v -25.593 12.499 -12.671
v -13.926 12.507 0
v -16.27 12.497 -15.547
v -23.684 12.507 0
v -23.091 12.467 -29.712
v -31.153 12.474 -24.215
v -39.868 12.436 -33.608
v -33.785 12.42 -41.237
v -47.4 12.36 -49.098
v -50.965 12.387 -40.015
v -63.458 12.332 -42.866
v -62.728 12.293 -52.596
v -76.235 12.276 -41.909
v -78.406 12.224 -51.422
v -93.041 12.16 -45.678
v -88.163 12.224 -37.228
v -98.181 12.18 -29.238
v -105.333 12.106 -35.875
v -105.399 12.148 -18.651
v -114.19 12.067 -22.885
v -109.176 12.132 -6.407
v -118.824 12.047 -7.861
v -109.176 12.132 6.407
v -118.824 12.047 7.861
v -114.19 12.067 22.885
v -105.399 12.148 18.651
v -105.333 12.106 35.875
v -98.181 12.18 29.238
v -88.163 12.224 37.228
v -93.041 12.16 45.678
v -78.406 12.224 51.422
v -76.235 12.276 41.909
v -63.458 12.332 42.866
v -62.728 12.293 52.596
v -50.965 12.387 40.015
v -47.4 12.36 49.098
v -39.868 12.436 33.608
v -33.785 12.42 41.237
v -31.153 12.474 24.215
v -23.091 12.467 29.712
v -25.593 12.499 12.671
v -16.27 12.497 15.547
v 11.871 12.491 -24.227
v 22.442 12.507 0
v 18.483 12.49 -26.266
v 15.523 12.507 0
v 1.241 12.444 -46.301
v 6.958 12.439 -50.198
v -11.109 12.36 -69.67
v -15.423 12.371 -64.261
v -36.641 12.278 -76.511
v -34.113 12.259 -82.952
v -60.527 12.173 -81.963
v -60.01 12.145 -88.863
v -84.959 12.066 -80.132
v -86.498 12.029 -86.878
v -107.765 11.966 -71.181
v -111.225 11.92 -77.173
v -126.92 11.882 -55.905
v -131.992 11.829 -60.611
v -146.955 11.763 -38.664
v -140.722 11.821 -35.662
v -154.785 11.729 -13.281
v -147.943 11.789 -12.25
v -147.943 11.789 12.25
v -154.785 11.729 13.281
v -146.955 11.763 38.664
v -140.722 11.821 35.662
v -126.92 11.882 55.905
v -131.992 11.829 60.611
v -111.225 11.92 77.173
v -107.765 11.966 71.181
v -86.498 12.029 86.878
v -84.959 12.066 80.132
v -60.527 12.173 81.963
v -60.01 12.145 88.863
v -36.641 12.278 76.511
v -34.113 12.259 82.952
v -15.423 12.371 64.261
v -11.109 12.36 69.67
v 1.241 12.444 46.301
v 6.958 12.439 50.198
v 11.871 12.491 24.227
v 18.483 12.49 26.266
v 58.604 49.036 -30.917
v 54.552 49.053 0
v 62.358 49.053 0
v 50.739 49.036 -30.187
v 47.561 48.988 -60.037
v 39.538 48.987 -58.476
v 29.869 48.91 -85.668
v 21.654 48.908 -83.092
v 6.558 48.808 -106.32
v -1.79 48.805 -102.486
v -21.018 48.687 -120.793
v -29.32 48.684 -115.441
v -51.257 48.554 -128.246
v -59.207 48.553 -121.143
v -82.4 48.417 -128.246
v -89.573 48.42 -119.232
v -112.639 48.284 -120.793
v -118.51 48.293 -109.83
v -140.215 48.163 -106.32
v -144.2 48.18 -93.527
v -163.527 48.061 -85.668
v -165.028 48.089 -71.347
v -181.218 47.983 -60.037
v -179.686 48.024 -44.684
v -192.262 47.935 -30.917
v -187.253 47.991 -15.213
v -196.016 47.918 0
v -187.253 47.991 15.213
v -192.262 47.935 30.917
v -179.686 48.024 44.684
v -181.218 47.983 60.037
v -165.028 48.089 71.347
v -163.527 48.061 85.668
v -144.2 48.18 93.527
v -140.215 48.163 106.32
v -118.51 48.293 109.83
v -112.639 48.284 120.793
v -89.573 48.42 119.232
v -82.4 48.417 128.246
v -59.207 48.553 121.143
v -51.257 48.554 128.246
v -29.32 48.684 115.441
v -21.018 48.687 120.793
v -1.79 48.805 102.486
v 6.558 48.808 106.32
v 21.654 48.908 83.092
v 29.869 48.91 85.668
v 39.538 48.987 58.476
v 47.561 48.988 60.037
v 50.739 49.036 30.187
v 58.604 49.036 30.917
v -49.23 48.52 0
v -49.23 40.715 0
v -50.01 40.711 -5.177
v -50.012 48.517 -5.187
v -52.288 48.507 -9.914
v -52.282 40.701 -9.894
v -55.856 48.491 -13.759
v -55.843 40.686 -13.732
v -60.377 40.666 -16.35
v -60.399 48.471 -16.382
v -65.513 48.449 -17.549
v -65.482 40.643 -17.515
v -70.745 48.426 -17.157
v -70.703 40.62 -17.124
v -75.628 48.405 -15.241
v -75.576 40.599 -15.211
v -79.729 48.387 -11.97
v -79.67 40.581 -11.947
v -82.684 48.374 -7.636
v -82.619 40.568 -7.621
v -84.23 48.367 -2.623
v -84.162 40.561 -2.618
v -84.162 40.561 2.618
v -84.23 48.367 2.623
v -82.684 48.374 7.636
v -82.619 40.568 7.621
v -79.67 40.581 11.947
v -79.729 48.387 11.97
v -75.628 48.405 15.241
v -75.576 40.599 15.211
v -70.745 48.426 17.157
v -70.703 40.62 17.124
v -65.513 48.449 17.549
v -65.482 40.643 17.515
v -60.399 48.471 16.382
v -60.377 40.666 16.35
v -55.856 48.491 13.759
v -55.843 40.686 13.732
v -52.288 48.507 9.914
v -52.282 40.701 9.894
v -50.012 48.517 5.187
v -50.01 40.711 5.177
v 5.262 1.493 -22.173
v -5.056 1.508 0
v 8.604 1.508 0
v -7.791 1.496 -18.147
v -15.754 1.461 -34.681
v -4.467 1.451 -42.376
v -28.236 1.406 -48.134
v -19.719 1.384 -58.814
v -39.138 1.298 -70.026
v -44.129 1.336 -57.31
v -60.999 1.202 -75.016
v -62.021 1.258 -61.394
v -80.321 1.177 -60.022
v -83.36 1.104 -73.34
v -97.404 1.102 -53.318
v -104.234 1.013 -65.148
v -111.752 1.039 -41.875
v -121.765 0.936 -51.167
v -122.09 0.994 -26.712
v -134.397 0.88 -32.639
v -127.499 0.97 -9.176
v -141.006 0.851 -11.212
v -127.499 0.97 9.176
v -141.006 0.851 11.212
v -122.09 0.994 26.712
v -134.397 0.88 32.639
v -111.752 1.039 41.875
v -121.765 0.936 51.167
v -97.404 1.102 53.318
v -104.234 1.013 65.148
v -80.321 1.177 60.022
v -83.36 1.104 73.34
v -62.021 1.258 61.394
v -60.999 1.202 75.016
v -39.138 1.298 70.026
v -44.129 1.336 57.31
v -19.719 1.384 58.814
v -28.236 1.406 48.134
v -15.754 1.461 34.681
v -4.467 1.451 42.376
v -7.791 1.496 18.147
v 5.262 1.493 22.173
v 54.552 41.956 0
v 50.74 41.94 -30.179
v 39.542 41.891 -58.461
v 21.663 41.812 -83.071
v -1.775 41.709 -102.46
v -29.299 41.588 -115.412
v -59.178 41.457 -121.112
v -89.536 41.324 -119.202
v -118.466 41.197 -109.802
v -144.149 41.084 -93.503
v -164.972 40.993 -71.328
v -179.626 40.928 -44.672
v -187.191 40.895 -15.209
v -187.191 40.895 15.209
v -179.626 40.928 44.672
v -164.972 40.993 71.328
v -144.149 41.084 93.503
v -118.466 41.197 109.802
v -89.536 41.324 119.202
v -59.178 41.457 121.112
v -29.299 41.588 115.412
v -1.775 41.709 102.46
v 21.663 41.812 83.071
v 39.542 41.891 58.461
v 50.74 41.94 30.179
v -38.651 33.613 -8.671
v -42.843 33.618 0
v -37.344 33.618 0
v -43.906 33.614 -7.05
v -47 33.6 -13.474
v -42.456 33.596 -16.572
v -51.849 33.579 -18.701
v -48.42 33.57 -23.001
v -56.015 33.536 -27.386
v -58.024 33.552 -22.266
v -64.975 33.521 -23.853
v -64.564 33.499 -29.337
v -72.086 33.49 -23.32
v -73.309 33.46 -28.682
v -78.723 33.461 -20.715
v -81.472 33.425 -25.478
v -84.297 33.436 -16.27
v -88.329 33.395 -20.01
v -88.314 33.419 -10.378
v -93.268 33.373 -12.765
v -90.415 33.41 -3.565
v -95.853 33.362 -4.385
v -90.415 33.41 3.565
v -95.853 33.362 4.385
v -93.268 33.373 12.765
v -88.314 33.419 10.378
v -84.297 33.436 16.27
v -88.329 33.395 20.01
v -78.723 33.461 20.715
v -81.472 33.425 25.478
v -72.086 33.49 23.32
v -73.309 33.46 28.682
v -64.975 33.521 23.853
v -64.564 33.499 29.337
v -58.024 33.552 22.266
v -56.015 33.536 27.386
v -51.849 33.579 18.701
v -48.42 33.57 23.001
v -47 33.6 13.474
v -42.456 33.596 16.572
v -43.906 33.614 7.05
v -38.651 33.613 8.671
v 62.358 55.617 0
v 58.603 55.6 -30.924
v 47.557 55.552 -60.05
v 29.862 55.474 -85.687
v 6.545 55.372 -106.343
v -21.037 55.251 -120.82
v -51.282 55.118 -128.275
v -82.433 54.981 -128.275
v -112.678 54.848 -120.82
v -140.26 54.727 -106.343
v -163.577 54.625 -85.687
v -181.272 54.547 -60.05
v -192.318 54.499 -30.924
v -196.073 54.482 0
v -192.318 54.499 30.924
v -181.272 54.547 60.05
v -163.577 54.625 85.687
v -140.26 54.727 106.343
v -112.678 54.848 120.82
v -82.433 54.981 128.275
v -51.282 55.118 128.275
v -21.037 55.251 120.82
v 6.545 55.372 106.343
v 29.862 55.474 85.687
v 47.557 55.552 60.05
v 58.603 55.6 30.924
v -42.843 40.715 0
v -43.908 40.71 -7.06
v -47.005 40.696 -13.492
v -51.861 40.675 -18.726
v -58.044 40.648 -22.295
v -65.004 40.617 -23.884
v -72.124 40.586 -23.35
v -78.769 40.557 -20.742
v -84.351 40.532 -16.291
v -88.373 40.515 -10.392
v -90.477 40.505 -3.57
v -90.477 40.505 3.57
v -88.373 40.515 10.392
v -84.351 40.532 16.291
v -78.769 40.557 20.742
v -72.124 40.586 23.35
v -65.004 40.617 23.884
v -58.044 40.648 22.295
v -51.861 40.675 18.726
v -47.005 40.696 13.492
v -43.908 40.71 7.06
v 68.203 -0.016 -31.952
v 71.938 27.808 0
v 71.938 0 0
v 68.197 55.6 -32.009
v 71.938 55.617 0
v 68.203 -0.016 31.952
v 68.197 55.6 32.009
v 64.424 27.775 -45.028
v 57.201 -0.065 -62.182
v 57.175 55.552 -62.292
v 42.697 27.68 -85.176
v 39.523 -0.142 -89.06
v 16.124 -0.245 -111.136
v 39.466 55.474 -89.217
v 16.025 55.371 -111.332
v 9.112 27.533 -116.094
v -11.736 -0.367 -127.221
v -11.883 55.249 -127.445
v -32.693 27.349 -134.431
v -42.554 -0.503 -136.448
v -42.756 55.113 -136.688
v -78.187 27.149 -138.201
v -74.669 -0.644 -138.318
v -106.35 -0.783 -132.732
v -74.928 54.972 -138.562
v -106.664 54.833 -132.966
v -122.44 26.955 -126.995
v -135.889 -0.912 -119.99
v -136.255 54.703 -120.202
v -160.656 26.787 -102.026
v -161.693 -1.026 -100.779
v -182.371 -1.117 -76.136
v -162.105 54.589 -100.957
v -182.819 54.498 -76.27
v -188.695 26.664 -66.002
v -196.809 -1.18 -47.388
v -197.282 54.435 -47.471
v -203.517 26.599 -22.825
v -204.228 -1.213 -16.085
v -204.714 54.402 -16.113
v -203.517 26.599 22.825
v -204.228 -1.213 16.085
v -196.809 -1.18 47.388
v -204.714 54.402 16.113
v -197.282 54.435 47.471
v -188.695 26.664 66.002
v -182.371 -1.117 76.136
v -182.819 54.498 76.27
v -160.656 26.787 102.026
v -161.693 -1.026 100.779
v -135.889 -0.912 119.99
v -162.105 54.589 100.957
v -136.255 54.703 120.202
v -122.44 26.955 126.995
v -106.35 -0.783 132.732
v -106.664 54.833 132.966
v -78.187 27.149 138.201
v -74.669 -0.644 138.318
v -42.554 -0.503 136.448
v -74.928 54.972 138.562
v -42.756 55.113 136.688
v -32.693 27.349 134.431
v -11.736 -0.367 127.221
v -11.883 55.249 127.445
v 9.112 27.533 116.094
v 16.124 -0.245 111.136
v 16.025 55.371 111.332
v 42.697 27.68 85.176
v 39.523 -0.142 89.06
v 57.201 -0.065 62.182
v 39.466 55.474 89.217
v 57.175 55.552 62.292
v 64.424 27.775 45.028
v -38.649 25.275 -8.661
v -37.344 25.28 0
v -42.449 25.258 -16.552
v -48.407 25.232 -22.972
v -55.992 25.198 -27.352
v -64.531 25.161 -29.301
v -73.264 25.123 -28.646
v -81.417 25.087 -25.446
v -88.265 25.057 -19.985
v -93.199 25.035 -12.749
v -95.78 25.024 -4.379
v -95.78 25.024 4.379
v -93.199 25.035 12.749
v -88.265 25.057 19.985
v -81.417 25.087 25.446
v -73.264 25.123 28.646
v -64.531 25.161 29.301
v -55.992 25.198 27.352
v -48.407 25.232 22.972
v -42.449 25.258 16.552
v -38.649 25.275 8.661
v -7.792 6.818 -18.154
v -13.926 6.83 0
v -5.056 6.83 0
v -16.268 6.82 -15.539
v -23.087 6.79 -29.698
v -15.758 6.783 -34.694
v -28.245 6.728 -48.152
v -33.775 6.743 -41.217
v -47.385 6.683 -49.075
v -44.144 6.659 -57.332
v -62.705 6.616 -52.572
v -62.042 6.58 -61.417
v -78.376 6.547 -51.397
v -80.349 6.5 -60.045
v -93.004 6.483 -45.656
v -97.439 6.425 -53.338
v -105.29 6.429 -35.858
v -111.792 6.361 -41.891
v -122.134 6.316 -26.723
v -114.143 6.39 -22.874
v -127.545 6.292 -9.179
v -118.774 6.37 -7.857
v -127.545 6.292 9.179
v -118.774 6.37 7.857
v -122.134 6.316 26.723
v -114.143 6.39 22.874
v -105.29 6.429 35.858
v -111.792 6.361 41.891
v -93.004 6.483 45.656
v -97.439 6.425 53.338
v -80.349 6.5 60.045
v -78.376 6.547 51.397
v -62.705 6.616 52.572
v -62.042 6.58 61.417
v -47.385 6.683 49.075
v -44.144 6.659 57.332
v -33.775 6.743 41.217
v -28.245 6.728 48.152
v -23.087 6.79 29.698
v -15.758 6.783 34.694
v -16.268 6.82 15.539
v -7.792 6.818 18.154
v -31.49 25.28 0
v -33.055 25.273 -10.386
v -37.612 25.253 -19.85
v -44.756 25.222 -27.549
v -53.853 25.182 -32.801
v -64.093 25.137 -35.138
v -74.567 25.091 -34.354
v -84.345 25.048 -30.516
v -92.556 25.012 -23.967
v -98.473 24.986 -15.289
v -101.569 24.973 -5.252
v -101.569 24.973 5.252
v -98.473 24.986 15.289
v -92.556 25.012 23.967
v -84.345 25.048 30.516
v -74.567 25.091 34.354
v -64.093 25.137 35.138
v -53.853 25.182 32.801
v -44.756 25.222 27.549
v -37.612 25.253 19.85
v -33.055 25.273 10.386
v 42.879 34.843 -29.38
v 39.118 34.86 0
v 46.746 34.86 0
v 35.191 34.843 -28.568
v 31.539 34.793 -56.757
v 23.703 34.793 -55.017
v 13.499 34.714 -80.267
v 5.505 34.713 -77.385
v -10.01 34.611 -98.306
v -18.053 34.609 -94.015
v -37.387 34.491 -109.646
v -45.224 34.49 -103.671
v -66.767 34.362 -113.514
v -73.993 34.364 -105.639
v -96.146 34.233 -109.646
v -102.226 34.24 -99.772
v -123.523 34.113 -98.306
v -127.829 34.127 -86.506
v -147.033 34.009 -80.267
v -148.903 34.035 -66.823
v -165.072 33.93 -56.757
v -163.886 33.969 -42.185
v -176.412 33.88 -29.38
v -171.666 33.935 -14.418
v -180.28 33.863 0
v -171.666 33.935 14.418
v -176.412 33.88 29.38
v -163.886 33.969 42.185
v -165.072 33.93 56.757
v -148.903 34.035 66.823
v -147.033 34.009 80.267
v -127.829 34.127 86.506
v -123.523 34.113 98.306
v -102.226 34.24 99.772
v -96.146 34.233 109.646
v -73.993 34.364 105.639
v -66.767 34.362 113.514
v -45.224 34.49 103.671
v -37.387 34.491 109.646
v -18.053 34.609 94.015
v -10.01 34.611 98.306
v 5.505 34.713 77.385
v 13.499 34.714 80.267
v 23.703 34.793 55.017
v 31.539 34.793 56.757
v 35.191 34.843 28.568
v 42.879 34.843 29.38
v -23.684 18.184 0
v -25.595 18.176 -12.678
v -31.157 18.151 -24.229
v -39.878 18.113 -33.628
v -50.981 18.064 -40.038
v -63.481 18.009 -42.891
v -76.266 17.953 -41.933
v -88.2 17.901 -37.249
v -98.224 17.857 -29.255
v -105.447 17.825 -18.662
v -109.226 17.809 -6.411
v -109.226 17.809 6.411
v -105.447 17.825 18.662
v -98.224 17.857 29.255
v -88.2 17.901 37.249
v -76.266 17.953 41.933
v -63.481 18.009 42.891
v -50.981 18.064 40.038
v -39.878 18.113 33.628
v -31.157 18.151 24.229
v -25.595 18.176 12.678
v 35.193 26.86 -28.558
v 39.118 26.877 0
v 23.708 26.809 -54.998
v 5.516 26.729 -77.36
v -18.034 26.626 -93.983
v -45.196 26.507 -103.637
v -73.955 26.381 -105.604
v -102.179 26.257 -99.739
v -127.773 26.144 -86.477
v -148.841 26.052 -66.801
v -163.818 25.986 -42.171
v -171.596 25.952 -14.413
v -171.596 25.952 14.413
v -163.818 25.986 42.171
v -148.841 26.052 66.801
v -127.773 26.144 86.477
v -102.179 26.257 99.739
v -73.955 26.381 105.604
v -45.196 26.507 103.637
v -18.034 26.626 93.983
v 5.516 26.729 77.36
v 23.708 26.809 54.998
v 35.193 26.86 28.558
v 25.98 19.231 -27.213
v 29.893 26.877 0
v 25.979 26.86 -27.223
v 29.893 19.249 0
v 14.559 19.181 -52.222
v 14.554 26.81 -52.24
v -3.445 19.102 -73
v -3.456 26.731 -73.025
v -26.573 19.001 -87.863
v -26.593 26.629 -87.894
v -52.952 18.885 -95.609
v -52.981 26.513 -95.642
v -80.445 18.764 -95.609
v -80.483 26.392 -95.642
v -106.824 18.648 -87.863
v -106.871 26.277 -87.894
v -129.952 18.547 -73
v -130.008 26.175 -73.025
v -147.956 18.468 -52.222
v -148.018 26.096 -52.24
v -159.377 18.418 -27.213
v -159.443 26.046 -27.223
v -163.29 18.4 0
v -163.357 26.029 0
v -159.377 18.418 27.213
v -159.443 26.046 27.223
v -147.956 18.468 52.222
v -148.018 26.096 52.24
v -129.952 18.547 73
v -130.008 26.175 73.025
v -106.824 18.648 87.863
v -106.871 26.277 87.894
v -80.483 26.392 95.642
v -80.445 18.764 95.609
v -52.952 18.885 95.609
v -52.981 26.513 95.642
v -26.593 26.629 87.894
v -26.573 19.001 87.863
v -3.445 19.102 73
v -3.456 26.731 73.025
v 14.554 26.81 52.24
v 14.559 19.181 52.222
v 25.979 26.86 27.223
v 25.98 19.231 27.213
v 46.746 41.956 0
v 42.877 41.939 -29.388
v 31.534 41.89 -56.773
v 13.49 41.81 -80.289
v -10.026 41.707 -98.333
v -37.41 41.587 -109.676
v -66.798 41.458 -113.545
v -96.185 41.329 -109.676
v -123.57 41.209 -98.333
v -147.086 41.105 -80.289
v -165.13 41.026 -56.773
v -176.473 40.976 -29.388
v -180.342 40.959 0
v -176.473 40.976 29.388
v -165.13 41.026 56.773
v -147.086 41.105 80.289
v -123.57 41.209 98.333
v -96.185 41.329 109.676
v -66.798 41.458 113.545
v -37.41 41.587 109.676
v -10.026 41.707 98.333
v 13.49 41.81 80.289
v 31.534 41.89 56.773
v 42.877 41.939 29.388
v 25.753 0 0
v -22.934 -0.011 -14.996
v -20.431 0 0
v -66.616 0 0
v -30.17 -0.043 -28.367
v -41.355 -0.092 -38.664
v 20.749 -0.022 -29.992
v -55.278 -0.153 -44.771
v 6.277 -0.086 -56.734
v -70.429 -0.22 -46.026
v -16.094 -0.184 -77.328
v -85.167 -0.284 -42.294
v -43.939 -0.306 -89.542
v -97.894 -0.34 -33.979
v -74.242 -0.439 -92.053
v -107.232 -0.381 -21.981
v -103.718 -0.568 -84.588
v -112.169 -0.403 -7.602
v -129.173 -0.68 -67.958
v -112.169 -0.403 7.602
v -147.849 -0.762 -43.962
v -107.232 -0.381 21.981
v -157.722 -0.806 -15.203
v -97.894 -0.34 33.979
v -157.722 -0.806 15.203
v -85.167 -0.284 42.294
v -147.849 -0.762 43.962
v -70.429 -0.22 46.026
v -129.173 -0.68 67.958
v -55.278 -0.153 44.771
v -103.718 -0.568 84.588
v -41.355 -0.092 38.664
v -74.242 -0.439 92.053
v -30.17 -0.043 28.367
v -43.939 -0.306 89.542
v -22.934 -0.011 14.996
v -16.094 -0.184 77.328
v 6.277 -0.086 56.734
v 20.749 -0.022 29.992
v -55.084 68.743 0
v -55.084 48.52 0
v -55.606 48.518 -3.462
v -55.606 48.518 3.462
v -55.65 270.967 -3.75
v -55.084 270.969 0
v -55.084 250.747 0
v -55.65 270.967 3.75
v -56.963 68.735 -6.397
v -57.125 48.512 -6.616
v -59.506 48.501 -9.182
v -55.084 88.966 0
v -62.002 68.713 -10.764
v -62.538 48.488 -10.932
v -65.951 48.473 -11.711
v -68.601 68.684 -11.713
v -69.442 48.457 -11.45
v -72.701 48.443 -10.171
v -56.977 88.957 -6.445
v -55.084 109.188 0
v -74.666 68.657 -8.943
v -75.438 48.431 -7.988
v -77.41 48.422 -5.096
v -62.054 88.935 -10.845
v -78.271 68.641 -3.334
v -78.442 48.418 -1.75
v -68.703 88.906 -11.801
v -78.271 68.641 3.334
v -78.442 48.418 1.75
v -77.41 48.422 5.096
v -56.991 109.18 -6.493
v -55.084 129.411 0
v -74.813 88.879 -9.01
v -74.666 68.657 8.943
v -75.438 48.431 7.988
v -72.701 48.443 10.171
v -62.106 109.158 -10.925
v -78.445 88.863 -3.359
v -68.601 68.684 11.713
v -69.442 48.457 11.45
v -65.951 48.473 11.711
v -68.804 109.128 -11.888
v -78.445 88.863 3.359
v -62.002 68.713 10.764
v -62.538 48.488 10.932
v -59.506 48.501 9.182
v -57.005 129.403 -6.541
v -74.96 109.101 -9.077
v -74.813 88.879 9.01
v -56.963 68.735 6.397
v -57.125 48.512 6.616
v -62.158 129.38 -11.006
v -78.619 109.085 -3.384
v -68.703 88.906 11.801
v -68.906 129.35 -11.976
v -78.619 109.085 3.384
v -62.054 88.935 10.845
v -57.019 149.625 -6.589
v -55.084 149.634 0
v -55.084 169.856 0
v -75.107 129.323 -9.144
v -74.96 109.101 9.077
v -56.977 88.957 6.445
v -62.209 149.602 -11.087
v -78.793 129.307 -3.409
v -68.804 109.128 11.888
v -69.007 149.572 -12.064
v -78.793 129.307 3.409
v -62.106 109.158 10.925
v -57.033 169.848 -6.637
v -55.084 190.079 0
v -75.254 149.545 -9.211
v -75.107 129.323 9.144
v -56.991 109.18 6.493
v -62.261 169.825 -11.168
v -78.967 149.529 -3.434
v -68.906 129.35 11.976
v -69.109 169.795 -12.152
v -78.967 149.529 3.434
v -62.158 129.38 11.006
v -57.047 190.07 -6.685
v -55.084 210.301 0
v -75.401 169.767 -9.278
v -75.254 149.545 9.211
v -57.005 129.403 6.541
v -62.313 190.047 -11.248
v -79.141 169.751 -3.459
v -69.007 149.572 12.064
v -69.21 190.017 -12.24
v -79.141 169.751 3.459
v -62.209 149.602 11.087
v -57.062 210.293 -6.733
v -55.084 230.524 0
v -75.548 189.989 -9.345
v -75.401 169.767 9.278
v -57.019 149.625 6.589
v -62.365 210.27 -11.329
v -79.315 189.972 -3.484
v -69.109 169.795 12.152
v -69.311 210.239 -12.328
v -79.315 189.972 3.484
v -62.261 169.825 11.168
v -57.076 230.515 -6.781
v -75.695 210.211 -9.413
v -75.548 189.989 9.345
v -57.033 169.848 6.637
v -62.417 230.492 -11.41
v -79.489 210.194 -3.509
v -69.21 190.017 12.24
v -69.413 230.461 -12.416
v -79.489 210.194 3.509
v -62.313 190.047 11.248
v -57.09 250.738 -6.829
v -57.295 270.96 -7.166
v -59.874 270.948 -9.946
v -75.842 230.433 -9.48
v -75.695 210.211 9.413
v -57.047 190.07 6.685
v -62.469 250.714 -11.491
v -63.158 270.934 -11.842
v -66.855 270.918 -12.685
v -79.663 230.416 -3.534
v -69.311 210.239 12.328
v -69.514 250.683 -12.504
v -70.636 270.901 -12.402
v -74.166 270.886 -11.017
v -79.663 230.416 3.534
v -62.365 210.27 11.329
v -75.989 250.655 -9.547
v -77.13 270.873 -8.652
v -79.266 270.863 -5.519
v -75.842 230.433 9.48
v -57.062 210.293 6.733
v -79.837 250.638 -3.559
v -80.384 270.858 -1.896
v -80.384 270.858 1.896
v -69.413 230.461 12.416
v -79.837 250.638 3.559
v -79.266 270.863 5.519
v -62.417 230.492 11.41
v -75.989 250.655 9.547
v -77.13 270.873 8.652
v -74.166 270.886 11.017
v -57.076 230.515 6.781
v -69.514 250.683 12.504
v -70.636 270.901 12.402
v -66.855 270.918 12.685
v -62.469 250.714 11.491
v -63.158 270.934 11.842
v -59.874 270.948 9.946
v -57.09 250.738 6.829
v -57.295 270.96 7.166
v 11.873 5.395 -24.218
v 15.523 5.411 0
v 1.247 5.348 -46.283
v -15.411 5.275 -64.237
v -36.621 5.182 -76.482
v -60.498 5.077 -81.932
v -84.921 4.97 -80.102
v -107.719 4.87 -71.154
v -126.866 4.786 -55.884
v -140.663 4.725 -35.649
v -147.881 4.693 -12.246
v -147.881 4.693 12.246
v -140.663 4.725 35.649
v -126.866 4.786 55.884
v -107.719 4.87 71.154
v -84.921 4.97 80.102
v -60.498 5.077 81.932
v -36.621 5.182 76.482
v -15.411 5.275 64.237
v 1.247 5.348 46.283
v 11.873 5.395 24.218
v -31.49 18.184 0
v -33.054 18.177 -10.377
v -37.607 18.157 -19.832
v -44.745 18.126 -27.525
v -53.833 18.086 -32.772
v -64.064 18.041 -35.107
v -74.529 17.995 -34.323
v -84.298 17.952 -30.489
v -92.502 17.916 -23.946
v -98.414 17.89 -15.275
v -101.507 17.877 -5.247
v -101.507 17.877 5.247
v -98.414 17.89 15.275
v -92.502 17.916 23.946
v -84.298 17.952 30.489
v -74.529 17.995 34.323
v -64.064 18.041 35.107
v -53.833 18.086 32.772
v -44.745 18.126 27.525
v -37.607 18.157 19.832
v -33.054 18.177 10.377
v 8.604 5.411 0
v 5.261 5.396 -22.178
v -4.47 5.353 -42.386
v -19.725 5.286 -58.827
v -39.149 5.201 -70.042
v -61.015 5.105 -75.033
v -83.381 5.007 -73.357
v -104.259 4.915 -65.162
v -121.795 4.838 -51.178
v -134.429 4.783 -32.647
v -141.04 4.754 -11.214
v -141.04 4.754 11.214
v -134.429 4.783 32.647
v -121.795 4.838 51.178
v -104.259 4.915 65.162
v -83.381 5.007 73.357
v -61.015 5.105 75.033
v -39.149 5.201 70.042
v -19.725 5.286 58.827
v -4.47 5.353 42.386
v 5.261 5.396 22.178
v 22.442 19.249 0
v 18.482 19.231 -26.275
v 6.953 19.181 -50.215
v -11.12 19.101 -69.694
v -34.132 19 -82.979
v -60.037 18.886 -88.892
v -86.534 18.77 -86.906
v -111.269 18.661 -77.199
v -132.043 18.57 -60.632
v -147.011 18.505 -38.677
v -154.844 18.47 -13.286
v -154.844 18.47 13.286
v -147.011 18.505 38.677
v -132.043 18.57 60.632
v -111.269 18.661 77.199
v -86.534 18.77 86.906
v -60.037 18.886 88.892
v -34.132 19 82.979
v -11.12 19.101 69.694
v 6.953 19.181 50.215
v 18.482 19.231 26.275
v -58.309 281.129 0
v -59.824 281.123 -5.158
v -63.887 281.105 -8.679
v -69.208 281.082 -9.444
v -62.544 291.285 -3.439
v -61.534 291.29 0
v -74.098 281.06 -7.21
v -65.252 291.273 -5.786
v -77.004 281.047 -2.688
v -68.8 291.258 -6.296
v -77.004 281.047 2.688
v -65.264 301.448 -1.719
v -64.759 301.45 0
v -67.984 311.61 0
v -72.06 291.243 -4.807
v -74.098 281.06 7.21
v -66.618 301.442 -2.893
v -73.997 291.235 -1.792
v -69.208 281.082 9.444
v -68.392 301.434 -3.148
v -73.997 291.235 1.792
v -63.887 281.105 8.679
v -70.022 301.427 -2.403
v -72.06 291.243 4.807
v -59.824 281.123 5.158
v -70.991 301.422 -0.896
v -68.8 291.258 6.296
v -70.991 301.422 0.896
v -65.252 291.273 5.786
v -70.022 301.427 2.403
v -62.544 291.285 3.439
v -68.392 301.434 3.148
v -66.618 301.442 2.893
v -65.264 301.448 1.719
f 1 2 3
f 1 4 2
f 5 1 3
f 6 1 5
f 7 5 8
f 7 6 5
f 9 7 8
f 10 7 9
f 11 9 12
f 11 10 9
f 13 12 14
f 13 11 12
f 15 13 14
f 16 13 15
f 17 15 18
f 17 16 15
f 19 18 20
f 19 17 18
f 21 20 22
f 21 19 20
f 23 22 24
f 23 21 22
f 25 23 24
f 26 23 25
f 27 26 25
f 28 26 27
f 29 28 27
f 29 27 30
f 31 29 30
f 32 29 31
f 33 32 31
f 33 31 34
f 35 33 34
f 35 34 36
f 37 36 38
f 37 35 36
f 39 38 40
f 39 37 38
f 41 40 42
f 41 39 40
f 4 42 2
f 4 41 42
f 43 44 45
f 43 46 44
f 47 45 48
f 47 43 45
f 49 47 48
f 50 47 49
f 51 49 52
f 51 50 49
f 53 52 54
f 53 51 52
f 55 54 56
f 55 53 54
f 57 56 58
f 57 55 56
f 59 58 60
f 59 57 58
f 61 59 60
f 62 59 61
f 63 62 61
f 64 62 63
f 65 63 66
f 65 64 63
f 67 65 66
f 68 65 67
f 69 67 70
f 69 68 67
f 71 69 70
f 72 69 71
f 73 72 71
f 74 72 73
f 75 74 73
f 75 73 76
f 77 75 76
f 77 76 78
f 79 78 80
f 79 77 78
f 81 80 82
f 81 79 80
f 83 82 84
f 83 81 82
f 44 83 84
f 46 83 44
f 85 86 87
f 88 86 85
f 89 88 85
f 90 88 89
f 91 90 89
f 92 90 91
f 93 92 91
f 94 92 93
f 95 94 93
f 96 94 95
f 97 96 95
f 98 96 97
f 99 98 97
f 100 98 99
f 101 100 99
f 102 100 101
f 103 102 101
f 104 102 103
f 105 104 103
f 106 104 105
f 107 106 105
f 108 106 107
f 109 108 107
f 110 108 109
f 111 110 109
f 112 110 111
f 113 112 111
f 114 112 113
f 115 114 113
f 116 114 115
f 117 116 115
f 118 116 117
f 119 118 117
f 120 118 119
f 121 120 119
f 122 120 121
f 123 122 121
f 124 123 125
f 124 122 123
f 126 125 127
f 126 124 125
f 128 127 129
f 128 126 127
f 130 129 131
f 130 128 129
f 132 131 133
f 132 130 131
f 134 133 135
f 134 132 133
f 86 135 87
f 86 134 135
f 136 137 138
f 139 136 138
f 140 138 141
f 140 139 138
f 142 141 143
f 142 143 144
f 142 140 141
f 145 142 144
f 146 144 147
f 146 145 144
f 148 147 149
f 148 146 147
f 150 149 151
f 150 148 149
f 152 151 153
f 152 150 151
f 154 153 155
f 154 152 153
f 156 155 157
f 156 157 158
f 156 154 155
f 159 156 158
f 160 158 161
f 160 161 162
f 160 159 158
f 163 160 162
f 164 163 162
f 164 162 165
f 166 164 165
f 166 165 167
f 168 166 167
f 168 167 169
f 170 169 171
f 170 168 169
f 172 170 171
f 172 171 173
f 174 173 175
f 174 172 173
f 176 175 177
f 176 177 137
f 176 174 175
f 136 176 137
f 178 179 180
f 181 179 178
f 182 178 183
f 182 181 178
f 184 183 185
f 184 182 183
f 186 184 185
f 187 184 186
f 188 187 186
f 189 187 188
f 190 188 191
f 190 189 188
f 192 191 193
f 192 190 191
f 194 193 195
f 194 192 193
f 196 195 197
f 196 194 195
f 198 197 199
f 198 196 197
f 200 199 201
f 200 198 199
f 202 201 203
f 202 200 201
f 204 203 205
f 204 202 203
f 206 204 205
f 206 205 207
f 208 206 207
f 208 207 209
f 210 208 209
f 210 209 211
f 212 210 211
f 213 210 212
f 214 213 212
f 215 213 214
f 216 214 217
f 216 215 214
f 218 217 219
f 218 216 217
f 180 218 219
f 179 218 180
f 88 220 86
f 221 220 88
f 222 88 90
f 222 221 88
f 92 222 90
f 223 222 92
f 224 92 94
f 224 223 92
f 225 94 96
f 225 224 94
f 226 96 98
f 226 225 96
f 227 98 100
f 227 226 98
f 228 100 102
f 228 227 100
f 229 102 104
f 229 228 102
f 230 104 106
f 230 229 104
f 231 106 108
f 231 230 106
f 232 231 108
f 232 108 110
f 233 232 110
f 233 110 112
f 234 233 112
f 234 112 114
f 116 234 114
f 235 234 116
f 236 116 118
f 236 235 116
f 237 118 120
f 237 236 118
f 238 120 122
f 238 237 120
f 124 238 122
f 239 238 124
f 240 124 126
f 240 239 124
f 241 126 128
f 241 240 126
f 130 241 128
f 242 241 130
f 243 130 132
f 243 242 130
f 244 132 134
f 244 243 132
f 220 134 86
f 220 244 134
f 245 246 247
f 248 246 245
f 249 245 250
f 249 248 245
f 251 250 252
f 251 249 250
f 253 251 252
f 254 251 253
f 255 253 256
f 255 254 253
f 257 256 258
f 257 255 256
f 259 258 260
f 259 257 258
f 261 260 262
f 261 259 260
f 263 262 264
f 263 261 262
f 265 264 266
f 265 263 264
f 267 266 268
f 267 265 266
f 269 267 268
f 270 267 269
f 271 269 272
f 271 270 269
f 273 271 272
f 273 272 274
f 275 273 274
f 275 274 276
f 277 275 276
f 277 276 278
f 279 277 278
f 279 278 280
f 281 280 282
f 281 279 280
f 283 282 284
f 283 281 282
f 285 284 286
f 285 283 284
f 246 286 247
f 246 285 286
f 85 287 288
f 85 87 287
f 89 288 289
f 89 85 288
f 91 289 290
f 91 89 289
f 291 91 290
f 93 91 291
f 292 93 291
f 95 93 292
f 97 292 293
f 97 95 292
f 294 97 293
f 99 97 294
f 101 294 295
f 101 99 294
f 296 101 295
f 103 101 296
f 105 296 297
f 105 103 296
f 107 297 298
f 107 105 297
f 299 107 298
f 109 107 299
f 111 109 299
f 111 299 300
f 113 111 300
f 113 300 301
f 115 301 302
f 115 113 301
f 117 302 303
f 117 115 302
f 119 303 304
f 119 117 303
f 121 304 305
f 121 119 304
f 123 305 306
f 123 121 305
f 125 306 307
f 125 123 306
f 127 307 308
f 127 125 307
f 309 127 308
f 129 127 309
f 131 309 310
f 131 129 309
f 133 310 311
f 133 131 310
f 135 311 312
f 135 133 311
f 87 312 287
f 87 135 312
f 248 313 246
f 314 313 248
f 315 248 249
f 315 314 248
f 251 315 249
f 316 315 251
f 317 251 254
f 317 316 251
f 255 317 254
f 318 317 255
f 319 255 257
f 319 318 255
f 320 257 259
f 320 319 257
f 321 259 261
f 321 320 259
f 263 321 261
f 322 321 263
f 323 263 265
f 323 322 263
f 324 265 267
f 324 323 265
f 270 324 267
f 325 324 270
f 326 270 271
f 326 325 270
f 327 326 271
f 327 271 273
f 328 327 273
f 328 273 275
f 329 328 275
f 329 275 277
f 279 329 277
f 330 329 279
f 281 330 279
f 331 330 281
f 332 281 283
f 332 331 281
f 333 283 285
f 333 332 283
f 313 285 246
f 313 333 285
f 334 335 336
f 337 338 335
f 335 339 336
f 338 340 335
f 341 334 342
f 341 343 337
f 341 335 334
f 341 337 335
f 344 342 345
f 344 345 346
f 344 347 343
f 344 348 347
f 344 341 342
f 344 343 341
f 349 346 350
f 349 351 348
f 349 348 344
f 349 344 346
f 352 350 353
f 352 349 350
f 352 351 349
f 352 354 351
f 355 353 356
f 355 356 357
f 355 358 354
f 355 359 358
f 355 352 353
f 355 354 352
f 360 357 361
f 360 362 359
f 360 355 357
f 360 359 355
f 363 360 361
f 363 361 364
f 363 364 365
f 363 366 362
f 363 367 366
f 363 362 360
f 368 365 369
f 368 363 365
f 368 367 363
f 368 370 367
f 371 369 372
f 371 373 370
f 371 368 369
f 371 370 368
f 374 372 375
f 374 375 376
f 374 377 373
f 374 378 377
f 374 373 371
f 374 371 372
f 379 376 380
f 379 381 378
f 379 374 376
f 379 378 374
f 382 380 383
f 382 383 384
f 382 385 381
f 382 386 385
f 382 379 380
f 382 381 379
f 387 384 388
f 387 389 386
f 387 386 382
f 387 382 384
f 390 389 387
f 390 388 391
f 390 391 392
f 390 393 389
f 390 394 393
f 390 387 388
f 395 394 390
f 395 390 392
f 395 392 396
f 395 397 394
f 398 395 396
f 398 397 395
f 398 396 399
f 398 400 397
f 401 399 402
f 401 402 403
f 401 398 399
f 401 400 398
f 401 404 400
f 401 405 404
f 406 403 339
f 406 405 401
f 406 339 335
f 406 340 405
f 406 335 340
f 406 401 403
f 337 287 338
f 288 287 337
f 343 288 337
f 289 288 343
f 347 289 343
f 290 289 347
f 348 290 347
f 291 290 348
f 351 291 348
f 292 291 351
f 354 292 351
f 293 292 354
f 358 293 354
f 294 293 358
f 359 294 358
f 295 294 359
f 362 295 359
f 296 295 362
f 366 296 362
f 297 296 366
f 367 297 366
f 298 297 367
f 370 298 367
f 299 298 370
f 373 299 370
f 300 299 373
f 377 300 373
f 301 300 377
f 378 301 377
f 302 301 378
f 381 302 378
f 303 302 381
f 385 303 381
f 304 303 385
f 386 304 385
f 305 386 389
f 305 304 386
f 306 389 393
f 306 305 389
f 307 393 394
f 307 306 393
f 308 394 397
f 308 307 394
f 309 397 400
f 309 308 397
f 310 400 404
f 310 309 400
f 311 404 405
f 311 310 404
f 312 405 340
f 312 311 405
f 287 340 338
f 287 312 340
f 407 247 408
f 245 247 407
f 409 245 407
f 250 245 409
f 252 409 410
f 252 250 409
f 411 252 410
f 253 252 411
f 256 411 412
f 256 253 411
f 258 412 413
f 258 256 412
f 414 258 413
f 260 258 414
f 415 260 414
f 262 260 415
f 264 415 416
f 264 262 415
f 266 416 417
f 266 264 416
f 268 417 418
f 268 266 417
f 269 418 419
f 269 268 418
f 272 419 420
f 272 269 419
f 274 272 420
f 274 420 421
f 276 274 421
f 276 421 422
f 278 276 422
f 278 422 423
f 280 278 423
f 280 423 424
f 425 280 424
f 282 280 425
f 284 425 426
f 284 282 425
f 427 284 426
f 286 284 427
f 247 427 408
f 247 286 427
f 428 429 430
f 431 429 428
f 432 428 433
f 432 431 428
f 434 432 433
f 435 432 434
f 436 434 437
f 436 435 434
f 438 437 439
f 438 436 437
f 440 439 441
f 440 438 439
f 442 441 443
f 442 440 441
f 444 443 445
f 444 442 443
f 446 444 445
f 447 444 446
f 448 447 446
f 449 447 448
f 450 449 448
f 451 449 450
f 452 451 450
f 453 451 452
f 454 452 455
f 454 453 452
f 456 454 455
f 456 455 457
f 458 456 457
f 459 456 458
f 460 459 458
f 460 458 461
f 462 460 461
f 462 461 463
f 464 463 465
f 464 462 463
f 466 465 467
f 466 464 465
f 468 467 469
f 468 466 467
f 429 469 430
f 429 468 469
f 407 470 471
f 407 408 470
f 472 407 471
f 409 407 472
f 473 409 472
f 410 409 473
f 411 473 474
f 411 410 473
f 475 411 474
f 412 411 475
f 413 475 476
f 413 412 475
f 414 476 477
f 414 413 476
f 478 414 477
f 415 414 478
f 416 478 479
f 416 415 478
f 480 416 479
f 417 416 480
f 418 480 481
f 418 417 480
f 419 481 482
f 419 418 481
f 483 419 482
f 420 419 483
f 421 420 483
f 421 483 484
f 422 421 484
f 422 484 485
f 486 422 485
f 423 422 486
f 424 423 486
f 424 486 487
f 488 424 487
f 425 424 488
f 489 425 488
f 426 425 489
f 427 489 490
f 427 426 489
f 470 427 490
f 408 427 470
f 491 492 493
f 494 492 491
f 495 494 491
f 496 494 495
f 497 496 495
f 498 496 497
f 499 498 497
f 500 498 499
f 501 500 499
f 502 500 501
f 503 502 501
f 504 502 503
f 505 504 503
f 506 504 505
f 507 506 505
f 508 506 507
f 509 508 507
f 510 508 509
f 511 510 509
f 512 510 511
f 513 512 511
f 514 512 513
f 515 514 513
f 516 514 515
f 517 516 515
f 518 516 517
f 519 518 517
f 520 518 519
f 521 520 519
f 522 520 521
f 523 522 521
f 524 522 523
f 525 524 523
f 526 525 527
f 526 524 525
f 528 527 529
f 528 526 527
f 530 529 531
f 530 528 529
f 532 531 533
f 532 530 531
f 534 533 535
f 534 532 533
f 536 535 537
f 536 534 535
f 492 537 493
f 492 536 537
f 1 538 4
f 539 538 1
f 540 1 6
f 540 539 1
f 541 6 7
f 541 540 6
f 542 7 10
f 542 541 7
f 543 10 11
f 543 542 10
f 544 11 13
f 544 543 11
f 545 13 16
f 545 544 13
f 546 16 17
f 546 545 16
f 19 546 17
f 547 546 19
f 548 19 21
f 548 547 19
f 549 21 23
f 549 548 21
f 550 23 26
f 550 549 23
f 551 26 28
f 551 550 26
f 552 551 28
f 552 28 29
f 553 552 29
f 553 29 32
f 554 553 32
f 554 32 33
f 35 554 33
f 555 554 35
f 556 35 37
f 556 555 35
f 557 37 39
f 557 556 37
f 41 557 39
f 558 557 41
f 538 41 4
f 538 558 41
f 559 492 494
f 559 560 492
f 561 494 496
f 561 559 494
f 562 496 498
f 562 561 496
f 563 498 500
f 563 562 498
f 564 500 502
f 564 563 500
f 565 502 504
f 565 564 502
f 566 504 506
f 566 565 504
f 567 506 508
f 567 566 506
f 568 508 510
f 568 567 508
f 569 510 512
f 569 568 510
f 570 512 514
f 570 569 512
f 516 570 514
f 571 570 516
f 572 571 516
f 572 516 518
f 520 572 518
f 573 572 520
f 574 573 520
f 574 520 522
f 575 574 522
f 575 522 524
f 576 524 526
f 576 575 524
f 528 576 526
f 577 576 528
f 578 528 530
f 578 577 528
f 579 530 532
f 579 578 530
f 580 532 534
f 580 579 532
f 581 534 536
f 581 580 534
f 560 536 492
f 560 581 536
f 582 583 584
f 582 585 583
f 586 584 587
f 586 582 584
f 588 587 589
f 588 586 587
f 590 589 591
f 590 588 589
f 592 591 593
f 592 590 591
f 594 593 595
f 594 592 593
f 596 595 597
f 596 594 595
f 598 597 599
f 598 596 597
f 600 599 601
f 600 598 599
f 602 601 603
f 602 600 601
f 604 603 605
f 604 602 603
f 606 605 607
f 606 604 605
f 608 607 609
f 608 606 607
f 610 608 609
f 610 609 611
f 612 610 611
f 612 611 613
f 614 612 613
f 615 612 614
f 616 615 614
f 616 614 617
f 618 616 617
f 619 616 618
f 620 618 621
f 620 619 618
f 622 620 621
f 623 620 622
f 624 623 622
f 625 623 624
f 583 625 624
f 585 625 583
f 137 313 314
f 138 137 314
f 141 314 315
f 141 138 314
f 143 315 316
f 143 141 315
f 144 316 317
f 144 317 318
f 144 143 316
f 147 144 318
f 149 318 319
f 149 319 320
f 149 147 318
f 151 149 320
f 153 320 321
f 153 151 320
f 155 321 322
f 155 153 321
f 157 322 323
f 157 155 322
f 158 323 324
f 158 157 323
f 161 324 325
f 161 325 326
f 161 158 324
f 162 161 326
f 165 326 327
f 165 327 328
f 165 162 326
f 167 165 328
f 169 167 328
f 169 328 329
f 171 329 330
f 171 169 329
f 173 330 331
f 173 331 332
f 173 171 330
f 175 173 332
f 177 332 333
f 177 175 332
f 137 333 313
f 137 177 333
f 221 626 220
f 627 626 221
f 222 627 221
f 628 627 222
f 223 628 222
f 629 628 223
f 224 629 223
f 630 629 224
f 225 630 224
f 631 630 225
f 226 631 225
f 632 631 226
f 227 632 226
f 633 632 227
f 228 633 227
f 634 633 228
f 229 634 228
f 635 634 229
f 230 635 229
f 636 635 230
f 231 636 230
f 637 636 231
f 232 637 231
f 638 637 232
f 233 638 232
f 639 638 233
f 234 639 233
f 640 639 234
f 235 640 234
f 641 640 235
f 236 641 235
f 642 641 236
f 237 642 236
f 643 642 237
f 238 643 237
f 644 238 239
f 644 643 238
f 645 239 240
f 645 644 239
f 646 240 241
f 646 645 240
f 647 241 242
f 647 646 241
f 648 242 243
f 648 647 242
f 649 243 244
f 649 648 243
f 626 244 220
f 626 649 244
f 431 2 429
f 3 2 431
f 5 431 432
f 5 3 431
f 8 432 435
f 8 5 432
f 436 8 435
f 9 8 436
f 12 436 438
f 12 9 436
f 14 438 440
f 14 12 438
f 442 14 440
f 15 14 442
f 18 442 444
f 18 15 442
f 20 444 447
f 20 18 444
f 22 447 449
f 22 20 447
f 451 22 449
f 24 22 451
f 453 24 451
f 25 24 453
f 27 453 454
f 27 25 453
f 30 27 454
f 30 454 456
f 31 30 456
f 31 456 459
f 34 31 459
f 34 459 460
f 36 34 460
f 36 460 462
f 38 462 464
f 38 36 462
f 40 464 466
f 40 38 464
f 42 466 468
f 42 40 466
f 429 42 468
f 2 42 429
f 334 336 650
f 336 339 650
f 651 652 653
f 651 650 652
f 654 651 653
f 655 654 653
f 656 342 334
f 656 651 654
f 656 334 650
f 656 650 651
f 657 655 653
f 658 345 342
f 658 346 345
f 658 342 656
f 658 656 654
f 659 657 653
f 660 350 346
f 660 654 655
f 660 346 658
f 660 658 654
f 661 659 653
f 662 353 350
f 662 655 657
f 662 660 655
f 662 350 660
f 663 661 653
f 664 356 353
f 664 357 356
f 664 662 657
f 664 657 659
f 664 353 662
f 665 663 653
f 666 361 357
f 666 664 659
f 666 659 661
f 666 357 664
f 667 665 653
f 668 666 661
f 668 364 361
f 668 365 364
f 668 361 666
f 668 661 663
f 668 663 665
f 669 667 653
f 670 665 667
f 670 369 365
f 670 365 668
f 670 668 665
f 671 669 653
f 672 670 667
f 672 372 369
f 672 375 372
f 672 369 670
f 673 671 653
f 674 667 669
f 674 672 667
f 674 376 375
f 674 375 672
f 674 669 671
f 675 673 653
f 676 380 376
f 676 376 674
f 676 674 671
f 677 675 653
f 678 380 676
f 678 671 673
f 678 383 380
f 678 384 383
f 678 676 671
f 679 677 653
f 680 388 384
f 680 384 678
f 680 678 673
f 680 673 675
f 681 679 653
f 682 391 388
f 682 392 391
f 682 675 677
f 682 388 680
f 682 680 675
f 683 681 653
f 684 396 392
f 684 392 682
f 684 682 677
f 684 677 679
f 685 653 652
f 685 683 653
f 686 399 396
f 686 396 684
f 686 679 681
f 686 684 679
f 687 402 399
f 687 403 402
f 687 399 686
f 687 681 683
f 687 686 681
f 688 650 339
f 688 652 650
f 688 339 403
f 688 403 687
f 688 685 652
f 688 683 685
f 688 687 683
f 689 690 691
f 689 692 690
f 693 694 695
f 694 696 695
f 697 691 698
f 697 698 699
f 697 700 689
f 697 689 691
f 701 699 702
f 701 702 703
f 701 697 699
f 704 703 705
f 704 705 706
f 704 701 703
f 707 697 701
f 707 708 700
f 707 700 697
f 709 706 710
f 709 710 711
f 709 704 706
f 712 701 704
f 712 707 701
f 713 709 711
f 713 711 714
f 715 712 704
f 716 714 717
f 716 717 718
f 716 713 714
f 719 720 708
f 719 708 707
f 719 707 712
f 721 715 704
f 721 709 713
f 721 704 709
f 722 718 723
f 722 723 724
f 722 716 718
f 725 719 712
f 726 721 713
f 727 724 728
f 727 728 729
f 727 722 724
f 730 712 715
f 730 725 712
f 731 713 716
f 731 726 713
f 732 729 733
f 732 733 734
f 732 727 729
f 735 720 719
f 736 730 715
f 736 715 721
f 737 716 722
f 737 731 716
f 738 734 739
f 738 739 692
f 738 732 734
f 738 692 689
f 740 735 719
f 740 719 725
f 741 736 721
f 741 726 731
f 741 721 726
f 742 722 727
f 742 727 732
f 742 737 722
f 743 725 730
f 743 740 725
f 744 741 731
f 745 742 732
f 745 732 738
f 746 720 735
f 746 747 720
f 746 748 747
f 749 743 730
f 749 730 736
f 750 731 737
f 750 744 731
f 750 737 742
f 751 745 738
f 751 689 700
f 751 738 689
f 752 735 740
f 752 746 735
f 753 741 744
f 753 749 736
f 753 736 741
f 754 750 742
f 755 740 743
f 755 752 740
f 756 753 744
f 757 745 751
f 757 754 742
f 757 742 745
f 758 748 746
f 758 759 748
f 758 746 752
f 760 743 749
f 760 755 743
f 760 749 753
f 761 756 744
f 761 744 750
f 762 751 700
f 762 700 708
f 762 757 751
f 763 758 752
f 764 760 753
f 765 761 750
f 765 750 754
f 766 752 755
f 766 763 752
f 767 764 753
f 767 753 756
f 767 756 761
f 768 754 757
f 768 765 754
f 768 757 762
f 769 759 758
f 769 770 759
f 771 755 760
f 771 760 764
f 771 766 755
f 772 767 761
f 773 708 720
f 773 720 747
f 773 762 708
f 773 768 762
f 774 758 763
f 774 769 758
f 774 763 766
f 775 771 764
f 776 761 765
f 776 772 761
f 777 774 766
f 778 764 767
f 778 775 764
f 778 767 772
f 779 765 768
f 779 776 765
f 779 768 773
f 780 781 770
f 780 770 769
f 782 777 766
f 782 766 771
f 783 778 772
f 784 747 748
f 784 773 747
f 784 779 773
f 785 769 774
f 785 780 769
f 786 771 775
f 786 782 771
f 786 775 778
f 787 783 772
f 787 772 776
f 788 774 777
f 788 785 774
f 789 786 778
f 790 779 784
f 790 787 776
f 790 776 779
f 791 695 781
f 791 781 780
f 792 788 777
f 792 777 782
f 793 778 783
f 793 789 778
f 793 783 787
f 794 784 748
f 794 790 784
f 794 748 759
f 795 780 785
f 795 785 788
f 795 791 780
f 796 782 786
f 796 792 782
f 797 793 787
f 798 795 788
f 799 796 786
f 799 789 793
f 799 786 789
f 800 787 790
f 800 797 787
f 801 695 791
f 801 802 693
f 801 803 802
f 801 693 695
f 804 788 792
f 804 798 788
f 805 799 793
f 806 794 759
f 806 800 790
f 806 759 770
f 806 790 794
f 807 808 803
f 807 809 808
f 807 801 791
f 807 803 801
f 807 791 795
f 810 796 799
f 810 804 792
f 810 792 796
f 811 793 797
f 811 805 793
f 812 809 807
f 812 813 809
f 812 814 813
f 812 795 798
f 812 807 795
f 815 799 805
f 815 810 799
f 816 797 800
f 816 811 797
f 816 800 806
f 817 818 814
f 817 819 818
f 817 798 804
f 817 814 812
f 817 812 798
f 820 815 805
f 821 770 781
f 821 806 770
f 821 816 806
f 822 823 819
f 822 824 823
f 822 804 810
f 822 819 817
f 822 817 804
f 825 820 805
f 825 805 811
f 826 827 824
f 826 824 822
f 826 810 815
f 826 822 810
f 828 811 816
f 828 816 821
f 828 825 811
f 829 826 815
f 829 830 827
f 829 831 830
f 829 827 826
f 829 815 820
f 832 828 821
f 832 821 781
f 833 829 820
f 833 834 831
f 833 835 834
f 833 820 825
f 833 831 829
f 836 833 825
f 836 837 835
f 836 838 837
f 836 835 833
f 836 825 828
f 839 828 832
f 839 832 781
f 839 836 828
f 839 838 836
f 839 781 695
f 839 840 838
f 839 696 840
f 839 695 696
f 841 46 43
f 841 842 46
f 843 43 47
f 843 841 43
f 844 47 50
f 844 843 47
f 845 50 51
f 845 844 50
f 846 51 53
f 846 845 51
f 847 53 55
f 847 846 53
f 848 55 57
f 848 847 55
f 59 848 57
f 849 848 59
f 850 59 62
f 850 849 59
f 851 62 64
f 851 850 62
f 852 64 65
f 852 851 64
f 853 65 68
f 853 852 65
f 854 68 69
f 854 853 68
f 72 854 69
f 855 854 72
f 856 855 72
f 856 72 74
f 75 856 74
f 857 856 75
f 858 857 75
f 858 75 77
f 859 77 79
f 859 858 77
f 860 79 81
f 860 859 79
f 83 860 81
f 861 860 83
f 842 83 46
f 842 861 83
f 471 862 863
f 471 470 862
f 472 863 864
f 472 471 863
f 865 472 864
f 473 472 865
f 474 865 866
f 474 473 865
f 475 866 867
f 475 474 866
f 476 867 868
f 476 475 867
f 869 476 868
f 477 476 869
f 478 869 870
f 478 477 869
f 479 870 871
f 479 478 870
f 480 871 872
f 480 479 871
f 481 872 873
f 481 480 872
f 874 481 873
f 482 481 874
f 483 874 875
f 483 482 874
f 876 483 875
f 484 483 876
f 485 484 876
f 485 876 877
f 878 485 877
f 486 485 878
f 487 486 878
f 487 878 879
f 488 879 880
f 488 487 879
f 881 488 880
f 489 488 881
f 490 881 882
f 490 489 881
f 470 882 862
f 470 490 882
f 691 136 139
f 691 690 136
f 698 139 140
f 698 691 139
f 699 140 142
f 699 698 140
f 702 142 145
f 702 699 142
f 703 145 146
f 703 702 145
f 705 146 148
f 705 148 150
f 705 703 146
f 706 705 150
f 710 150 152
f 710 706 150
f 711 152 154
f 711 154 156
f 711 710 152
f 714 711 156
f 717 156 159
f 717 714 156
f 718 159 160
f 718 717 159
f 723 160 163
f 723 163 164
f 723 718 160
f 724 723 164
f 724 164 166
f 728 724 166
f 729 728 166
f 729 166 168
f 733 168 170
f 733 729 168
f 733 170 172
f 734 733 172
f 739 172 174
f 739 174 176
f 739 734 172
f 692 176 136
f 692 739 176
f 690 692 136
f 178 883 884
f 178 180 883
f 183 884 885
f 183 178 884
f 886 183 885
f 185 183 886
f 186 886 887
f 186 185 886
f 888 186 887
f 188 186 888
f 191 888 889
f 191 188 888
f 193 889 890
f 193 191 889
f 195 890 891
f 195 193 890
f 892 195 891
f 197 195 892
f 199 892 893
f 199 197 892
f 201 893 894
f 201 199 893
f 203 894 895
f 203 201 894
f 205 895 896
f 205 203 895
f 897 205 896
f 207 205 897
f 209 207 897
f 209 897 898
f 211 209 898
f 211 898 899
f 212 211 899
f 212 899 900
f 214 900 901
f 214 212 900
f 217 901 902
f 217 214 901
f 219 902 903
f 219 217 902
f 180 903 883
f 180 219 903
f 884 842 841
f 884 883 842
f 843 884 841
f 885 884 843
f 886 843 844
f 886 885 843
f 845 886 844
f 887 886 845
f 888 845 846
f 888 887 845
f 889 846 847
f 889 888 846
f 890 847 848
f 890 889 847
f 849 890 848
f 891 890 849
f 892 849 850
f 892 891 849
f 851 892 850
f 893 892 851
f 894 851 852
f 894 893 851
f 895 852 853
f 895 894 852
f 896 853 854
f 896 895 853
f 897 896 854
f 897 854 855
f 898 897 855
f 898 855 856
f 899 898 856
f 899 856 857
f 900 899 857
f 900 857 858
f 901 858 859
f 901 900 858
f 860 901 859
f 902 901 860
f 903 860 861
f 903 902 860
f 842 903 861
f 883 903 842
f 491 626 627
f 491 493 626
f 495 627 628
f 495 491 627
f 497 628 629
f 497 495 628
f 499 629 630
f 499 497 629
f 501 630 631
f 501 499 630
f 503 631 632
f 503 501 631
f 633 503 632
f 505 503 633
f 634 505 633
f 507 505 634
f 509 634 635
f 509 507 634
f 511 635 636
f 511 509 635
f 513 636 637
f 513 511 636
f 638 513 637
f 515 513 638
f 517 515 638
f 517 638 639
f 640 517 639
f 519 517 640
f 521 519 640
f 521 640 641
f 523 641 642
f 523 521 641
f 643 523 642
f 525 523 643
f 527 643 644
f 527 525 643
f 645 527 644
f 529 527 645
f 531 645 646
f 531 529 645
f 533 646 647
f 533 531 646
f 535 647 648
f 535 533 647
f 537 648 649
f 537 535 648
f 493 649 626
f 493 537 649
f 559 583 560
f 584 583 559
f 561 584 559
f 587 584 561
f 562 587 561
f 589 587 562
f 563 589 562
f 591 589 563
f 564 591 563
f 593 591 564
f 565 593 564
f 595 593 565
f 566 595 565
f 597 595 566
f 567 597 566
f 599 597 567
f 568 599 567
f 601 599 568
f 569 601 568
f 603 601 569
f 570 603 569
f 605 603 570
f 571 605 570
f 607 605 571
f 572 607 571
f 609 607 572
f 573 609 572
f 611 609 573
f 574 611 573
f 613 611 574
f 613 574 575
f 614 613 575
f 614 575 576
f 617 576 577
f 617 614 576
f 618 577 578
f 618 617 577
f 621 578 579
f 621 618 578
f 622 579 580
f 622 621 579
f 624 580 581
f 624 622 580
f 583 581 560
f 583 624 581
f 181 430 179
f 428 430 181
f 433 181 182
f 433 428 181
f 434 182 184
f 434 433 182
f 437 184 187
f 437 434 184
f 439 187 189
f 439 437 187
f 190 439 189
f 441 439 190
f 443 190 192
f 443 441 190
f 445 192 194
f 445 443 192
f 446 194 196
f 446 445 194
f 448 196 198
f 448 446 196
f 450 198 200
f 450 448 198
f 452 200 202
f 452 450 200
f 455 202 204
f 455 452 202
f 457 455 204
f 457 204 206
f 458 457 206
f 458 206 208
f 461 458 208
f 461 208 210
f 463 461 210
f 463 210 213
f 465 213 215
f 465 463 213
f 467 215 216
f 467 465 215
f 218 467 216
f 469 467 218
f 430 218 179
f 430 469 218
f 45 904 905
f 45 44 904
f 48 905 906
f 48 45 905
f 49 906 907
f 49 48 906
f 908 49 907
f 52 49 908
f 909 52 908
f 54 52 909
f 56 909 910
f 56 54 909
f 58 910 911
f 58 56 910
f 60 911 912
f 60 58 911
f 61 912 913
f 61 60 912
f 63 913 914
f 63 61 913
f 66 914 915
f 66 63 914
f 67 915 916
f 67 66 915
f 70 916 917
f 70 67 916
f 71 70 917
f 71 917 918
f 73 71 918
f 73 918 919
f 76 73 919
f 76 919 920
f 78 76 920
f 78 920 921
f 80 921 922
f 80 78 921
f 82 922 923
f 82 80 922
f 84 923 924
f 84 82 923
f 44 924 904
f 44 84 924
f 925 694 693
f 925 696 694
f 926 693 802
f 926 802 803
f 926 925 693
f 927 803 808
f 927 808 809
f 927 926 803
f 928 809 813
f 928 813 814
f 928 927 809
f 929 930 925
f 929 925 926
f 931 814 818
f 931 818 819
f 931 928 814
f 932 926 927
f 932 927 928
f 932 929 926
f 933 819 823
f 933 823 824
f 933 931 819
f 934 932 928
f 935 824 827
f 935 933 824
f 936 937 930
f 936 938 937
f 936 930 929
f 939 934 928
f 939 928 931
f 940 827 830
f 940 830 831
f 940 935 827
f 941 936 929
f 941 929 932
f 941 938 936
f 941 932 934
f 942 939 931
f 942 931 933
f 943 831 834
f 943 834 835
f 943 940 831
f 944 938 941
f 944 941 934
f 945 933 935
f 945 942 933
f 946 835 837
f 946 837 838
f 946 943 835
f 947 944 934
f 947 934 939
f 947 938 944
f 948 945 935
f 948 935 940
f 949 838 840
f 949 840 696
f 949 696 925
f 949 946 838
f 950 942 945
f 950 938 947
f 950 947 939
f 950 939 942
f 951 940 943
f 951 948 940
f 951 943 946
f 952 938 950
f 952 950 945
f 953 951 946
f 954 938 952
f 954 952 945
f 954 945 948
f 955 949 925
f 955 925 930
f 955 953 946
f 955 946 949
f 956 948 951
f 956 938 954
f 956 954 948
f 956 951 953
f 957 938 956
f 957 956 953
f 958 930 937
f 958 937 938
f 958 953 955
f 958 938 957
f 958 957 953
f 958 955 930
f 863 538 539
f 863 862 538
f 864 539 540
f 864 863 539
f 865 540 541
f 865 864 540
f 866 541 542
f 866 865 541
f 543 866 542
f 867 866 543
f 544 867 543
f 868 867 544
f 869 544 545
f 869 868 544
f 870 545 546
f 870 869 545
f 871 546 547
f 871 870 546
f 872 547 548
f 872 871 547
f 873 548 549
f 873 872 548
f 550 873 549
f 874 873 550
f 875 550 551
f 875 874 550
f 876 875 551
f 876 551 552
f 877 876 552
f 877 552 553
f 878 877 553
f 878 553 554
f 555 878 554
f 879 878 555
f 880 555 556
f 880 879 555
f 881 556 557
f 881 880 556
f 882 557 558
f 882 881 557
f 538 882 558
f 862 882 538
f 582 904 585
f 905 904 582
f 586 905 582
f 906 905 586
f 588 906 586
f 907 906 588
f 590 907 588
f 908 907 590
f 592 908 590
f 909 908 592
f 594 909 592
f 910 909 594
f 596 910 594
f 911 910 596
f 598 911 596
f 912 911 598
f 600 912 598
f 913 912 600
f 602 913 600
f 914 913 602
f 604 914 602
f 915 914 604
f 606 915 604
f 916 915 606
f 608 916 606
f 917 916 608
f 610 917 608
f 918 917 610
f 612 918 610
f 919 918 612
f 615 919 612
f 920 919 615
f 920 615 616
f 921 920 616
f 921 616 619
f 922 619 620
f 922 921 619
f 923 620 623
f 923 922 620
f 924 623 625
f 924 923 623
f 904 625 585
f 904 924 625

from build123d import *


with BuildPart() as f1:
    # F0 (on Top) → F1 (revolve)
    with BuildSketch(Plane.XY):
        Polygon((-66.6158646345, 0), (71.9380378723, 0), (71.9380378723, 55.6167066097), (62.3581297696, 55.6167066097), (62.3581297696, 49.0526966751), (54.5522719622, 49.0526966751), (54.5522719622, 41.956461966), (46.7464216053, 41.956461966), (46.7464216053, 34.8602347076), (39.1179732978, 34.8602347076), (39.1179732978, 26.8769748509), (29.892873019, 26.8769748509), (29.892873019, 19.2485246807), (22.4418267608, 19.2485246807), (22.4418267608, 12.5071061775), (15.5230062082, 12.5071061775), (15.5230062082, 5.4108761251), (8.6041800678, 5.4108761251), (8.6041800678, 1.507949084), (-5.0560631789, 1.507949084), (-5.0560631789, 6.8301218562), (-13.9263533056, 6.8301218562), (-13.9263533056, 12.5071061775), (-23.6836709082, 12.5071061775), (-23.6836709082, 18.1840918958), (-31.4895249903, 18.1840918958), (-31.4895249903, 25.2803210169), (-37.3439155519, 25.2803210169), (-37.3439155519, 33.6183905602), (-42.843490839, 33.6183905602), (-42.843490839, 40.7146215439), (-49.2300987244, 40.7146215439), (-49.2300987244, 48.5204793513), (-55.0844892859, 48.5204793513), (-55.0844892859, 170.8428710699), (-55.0844892859, 270.9693610668), (-67.9839998484, 311.6098642349), align=None)
    revolve(axis=Axis((-67.2999322414, 155.8049321175, 0), (-0.0043904965, 0.9999903617, 0)))


solid = f1.part
